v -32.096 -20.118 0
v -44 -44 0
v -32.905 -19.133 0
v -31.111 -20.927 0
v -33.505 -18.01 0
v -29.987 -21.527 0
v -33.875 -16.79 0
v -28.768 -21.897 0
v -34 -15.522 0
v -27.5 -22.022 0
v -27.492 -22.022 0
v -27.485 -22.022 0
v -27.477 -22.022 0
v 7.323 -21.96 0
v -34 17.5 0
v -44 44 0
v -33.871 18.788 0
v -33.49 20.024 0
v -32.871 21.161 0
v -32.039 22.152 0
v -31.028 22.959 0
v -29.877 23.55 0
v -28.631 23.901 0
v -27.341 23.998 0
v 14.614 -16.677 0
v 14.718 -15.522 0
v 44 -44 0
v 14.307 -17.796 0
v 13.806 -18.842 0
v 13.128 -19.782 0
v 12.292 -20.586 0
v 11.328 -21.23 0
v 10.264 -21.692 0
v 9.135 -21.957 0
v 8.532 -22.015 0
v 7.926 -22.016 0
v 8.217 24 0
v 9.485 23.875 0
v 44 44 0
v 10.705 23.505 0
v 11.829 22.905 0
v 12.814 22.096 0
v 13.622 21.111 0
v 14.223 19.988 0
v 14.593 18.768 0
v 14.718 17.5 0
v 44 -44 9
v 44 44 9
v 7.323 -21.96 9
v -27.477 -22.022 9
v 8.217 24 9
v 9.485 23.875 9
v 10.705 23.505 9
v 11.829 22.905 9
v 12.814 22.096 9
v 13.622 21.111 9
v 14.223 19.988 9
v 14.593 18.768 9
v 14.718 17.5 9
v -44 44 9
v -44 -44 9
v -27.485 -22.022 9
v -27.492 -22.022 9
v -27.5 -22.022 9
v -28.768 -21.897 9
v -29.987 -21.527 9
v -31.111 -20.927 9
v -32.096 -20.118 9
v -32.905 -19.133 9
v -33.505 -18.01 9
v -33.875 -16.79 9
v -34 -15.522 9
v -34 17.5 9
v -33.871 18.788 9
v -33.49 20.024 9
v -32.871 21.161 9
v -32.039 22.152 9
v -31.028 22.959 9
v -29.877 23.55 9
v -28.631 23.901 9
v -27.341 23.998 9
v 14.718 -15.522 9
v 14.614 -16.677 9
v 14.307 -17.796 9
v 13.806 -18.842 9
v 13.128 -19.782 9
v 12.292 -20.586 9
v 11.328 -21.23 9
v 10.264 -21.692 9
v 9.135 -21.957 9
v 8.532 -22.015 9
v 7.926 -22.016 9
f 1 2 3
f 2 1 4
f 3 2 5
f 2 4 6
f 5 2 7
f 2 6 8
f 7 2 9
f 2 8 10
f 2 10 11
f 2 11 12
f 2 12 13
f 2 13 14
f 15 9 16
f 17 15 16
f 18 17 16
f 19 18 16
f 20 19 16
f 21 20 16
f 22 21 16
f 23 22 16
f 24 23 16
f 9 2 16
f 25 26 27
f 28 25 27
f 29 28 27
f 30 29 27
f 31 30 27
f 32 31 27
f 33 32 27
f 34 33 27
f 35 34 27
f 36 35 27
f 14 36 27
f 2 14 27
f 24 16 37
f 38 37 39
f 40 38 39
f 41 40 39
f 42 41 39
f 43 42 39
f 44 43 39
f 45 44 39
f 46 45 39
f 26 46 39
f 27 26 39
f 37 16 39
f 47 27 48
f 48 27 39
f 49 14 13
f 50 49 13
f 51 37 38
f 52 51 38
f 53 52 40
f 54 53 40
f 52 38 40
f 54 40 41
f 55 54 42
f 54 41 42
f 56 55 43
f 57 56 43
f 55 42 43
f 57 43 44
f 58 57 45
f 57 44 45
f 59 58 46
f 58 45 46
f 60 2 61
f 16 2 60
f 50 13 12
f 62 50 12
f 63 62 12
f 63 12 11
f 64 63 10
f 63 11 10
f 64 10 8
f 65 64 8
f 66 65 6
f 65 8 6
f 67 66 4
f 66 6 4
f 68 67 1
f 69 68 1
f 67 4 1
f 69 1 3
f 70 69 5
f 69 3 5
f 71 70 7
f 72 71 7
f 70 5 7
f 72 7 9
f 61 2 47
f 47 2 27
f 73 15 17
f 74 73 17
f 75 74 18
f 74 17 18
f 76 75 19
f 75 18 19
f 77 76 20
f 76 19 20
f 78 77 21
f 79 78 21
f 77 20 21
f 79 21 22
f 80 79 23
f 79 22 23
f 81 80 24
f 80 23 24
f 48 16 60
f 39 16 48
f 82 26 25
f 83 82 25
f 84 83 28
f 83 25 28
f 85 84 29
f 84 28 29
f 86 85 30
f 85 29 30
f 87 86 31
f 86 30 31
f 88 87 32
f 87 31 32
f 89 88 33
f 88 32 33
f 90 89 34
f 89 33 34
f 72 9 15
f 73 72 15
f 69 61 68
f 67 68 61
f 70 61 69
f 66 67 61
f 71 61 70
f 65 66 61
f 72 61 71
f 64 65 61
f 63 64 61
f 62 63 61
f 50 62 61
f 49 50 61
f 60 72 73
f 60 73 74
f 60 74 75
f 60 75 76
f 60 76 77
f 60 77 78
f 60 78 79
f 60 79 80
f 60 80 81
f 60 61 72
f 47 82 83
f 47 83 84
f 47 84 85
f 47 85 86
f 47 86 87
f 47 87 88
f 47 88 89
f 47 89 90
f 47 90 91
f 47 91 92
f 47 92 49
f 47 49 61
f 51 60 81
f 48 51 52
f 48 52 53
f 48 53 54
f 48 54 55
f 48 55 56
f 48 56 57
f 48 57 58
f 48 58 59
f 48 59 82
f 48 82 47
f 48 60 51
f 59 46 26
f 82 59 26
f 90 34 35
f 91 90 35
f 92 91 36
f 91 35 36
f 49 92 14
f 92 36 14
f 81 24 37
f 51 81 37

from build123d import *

# Parameters (mm, degrees)
F0_W     = 88
F0_H     = 88
F1_DEPTH = 9


with BuildPart() as f1:
    # F0 (on Top) → F1 (new body)
    with BuildSketch(Plane.XY):
        Rectangle(F0_W, F0_H)
        with BuildLine():
            ThreePointArc((-34, 17.5), (-32.039498, 22.152199), (-27.340629, 23.998046))
            Line((-27.340629, 23.998046), (8.217317, 24))
            ThreePointArc((8.217317, 24), (12.813742, 22.09632), (14.717675, 17.5))
            Line((14.717675, 17.5), (14.717675, -15.522273))
            ThreePointArc((14.717675, -15.522273), (13.127514, -19.781789), (9.135066, -21.957209))
            ThreePointArc((9.135066, -21.957209), (8.229219, -22.022263), (7.323146, -21.960427))
            Line((7.323146, -21.960427), (-27.476912, -22.022232))
            ThreePointArc((-27.476912, -22.022232), (-27.488456, -22.022263), (-27.5, -22.022273))
            ThreePointArc((-27.5, -22.022273), (-32.096194, -20.118467), (-34, -15.522273))
            Line((-34, -15.522273), (-34, 17.5))
        make_face(mode=Mode.SUBTRACT)
    extrude(amount=F1_DEPTH)


solid = f1.part
